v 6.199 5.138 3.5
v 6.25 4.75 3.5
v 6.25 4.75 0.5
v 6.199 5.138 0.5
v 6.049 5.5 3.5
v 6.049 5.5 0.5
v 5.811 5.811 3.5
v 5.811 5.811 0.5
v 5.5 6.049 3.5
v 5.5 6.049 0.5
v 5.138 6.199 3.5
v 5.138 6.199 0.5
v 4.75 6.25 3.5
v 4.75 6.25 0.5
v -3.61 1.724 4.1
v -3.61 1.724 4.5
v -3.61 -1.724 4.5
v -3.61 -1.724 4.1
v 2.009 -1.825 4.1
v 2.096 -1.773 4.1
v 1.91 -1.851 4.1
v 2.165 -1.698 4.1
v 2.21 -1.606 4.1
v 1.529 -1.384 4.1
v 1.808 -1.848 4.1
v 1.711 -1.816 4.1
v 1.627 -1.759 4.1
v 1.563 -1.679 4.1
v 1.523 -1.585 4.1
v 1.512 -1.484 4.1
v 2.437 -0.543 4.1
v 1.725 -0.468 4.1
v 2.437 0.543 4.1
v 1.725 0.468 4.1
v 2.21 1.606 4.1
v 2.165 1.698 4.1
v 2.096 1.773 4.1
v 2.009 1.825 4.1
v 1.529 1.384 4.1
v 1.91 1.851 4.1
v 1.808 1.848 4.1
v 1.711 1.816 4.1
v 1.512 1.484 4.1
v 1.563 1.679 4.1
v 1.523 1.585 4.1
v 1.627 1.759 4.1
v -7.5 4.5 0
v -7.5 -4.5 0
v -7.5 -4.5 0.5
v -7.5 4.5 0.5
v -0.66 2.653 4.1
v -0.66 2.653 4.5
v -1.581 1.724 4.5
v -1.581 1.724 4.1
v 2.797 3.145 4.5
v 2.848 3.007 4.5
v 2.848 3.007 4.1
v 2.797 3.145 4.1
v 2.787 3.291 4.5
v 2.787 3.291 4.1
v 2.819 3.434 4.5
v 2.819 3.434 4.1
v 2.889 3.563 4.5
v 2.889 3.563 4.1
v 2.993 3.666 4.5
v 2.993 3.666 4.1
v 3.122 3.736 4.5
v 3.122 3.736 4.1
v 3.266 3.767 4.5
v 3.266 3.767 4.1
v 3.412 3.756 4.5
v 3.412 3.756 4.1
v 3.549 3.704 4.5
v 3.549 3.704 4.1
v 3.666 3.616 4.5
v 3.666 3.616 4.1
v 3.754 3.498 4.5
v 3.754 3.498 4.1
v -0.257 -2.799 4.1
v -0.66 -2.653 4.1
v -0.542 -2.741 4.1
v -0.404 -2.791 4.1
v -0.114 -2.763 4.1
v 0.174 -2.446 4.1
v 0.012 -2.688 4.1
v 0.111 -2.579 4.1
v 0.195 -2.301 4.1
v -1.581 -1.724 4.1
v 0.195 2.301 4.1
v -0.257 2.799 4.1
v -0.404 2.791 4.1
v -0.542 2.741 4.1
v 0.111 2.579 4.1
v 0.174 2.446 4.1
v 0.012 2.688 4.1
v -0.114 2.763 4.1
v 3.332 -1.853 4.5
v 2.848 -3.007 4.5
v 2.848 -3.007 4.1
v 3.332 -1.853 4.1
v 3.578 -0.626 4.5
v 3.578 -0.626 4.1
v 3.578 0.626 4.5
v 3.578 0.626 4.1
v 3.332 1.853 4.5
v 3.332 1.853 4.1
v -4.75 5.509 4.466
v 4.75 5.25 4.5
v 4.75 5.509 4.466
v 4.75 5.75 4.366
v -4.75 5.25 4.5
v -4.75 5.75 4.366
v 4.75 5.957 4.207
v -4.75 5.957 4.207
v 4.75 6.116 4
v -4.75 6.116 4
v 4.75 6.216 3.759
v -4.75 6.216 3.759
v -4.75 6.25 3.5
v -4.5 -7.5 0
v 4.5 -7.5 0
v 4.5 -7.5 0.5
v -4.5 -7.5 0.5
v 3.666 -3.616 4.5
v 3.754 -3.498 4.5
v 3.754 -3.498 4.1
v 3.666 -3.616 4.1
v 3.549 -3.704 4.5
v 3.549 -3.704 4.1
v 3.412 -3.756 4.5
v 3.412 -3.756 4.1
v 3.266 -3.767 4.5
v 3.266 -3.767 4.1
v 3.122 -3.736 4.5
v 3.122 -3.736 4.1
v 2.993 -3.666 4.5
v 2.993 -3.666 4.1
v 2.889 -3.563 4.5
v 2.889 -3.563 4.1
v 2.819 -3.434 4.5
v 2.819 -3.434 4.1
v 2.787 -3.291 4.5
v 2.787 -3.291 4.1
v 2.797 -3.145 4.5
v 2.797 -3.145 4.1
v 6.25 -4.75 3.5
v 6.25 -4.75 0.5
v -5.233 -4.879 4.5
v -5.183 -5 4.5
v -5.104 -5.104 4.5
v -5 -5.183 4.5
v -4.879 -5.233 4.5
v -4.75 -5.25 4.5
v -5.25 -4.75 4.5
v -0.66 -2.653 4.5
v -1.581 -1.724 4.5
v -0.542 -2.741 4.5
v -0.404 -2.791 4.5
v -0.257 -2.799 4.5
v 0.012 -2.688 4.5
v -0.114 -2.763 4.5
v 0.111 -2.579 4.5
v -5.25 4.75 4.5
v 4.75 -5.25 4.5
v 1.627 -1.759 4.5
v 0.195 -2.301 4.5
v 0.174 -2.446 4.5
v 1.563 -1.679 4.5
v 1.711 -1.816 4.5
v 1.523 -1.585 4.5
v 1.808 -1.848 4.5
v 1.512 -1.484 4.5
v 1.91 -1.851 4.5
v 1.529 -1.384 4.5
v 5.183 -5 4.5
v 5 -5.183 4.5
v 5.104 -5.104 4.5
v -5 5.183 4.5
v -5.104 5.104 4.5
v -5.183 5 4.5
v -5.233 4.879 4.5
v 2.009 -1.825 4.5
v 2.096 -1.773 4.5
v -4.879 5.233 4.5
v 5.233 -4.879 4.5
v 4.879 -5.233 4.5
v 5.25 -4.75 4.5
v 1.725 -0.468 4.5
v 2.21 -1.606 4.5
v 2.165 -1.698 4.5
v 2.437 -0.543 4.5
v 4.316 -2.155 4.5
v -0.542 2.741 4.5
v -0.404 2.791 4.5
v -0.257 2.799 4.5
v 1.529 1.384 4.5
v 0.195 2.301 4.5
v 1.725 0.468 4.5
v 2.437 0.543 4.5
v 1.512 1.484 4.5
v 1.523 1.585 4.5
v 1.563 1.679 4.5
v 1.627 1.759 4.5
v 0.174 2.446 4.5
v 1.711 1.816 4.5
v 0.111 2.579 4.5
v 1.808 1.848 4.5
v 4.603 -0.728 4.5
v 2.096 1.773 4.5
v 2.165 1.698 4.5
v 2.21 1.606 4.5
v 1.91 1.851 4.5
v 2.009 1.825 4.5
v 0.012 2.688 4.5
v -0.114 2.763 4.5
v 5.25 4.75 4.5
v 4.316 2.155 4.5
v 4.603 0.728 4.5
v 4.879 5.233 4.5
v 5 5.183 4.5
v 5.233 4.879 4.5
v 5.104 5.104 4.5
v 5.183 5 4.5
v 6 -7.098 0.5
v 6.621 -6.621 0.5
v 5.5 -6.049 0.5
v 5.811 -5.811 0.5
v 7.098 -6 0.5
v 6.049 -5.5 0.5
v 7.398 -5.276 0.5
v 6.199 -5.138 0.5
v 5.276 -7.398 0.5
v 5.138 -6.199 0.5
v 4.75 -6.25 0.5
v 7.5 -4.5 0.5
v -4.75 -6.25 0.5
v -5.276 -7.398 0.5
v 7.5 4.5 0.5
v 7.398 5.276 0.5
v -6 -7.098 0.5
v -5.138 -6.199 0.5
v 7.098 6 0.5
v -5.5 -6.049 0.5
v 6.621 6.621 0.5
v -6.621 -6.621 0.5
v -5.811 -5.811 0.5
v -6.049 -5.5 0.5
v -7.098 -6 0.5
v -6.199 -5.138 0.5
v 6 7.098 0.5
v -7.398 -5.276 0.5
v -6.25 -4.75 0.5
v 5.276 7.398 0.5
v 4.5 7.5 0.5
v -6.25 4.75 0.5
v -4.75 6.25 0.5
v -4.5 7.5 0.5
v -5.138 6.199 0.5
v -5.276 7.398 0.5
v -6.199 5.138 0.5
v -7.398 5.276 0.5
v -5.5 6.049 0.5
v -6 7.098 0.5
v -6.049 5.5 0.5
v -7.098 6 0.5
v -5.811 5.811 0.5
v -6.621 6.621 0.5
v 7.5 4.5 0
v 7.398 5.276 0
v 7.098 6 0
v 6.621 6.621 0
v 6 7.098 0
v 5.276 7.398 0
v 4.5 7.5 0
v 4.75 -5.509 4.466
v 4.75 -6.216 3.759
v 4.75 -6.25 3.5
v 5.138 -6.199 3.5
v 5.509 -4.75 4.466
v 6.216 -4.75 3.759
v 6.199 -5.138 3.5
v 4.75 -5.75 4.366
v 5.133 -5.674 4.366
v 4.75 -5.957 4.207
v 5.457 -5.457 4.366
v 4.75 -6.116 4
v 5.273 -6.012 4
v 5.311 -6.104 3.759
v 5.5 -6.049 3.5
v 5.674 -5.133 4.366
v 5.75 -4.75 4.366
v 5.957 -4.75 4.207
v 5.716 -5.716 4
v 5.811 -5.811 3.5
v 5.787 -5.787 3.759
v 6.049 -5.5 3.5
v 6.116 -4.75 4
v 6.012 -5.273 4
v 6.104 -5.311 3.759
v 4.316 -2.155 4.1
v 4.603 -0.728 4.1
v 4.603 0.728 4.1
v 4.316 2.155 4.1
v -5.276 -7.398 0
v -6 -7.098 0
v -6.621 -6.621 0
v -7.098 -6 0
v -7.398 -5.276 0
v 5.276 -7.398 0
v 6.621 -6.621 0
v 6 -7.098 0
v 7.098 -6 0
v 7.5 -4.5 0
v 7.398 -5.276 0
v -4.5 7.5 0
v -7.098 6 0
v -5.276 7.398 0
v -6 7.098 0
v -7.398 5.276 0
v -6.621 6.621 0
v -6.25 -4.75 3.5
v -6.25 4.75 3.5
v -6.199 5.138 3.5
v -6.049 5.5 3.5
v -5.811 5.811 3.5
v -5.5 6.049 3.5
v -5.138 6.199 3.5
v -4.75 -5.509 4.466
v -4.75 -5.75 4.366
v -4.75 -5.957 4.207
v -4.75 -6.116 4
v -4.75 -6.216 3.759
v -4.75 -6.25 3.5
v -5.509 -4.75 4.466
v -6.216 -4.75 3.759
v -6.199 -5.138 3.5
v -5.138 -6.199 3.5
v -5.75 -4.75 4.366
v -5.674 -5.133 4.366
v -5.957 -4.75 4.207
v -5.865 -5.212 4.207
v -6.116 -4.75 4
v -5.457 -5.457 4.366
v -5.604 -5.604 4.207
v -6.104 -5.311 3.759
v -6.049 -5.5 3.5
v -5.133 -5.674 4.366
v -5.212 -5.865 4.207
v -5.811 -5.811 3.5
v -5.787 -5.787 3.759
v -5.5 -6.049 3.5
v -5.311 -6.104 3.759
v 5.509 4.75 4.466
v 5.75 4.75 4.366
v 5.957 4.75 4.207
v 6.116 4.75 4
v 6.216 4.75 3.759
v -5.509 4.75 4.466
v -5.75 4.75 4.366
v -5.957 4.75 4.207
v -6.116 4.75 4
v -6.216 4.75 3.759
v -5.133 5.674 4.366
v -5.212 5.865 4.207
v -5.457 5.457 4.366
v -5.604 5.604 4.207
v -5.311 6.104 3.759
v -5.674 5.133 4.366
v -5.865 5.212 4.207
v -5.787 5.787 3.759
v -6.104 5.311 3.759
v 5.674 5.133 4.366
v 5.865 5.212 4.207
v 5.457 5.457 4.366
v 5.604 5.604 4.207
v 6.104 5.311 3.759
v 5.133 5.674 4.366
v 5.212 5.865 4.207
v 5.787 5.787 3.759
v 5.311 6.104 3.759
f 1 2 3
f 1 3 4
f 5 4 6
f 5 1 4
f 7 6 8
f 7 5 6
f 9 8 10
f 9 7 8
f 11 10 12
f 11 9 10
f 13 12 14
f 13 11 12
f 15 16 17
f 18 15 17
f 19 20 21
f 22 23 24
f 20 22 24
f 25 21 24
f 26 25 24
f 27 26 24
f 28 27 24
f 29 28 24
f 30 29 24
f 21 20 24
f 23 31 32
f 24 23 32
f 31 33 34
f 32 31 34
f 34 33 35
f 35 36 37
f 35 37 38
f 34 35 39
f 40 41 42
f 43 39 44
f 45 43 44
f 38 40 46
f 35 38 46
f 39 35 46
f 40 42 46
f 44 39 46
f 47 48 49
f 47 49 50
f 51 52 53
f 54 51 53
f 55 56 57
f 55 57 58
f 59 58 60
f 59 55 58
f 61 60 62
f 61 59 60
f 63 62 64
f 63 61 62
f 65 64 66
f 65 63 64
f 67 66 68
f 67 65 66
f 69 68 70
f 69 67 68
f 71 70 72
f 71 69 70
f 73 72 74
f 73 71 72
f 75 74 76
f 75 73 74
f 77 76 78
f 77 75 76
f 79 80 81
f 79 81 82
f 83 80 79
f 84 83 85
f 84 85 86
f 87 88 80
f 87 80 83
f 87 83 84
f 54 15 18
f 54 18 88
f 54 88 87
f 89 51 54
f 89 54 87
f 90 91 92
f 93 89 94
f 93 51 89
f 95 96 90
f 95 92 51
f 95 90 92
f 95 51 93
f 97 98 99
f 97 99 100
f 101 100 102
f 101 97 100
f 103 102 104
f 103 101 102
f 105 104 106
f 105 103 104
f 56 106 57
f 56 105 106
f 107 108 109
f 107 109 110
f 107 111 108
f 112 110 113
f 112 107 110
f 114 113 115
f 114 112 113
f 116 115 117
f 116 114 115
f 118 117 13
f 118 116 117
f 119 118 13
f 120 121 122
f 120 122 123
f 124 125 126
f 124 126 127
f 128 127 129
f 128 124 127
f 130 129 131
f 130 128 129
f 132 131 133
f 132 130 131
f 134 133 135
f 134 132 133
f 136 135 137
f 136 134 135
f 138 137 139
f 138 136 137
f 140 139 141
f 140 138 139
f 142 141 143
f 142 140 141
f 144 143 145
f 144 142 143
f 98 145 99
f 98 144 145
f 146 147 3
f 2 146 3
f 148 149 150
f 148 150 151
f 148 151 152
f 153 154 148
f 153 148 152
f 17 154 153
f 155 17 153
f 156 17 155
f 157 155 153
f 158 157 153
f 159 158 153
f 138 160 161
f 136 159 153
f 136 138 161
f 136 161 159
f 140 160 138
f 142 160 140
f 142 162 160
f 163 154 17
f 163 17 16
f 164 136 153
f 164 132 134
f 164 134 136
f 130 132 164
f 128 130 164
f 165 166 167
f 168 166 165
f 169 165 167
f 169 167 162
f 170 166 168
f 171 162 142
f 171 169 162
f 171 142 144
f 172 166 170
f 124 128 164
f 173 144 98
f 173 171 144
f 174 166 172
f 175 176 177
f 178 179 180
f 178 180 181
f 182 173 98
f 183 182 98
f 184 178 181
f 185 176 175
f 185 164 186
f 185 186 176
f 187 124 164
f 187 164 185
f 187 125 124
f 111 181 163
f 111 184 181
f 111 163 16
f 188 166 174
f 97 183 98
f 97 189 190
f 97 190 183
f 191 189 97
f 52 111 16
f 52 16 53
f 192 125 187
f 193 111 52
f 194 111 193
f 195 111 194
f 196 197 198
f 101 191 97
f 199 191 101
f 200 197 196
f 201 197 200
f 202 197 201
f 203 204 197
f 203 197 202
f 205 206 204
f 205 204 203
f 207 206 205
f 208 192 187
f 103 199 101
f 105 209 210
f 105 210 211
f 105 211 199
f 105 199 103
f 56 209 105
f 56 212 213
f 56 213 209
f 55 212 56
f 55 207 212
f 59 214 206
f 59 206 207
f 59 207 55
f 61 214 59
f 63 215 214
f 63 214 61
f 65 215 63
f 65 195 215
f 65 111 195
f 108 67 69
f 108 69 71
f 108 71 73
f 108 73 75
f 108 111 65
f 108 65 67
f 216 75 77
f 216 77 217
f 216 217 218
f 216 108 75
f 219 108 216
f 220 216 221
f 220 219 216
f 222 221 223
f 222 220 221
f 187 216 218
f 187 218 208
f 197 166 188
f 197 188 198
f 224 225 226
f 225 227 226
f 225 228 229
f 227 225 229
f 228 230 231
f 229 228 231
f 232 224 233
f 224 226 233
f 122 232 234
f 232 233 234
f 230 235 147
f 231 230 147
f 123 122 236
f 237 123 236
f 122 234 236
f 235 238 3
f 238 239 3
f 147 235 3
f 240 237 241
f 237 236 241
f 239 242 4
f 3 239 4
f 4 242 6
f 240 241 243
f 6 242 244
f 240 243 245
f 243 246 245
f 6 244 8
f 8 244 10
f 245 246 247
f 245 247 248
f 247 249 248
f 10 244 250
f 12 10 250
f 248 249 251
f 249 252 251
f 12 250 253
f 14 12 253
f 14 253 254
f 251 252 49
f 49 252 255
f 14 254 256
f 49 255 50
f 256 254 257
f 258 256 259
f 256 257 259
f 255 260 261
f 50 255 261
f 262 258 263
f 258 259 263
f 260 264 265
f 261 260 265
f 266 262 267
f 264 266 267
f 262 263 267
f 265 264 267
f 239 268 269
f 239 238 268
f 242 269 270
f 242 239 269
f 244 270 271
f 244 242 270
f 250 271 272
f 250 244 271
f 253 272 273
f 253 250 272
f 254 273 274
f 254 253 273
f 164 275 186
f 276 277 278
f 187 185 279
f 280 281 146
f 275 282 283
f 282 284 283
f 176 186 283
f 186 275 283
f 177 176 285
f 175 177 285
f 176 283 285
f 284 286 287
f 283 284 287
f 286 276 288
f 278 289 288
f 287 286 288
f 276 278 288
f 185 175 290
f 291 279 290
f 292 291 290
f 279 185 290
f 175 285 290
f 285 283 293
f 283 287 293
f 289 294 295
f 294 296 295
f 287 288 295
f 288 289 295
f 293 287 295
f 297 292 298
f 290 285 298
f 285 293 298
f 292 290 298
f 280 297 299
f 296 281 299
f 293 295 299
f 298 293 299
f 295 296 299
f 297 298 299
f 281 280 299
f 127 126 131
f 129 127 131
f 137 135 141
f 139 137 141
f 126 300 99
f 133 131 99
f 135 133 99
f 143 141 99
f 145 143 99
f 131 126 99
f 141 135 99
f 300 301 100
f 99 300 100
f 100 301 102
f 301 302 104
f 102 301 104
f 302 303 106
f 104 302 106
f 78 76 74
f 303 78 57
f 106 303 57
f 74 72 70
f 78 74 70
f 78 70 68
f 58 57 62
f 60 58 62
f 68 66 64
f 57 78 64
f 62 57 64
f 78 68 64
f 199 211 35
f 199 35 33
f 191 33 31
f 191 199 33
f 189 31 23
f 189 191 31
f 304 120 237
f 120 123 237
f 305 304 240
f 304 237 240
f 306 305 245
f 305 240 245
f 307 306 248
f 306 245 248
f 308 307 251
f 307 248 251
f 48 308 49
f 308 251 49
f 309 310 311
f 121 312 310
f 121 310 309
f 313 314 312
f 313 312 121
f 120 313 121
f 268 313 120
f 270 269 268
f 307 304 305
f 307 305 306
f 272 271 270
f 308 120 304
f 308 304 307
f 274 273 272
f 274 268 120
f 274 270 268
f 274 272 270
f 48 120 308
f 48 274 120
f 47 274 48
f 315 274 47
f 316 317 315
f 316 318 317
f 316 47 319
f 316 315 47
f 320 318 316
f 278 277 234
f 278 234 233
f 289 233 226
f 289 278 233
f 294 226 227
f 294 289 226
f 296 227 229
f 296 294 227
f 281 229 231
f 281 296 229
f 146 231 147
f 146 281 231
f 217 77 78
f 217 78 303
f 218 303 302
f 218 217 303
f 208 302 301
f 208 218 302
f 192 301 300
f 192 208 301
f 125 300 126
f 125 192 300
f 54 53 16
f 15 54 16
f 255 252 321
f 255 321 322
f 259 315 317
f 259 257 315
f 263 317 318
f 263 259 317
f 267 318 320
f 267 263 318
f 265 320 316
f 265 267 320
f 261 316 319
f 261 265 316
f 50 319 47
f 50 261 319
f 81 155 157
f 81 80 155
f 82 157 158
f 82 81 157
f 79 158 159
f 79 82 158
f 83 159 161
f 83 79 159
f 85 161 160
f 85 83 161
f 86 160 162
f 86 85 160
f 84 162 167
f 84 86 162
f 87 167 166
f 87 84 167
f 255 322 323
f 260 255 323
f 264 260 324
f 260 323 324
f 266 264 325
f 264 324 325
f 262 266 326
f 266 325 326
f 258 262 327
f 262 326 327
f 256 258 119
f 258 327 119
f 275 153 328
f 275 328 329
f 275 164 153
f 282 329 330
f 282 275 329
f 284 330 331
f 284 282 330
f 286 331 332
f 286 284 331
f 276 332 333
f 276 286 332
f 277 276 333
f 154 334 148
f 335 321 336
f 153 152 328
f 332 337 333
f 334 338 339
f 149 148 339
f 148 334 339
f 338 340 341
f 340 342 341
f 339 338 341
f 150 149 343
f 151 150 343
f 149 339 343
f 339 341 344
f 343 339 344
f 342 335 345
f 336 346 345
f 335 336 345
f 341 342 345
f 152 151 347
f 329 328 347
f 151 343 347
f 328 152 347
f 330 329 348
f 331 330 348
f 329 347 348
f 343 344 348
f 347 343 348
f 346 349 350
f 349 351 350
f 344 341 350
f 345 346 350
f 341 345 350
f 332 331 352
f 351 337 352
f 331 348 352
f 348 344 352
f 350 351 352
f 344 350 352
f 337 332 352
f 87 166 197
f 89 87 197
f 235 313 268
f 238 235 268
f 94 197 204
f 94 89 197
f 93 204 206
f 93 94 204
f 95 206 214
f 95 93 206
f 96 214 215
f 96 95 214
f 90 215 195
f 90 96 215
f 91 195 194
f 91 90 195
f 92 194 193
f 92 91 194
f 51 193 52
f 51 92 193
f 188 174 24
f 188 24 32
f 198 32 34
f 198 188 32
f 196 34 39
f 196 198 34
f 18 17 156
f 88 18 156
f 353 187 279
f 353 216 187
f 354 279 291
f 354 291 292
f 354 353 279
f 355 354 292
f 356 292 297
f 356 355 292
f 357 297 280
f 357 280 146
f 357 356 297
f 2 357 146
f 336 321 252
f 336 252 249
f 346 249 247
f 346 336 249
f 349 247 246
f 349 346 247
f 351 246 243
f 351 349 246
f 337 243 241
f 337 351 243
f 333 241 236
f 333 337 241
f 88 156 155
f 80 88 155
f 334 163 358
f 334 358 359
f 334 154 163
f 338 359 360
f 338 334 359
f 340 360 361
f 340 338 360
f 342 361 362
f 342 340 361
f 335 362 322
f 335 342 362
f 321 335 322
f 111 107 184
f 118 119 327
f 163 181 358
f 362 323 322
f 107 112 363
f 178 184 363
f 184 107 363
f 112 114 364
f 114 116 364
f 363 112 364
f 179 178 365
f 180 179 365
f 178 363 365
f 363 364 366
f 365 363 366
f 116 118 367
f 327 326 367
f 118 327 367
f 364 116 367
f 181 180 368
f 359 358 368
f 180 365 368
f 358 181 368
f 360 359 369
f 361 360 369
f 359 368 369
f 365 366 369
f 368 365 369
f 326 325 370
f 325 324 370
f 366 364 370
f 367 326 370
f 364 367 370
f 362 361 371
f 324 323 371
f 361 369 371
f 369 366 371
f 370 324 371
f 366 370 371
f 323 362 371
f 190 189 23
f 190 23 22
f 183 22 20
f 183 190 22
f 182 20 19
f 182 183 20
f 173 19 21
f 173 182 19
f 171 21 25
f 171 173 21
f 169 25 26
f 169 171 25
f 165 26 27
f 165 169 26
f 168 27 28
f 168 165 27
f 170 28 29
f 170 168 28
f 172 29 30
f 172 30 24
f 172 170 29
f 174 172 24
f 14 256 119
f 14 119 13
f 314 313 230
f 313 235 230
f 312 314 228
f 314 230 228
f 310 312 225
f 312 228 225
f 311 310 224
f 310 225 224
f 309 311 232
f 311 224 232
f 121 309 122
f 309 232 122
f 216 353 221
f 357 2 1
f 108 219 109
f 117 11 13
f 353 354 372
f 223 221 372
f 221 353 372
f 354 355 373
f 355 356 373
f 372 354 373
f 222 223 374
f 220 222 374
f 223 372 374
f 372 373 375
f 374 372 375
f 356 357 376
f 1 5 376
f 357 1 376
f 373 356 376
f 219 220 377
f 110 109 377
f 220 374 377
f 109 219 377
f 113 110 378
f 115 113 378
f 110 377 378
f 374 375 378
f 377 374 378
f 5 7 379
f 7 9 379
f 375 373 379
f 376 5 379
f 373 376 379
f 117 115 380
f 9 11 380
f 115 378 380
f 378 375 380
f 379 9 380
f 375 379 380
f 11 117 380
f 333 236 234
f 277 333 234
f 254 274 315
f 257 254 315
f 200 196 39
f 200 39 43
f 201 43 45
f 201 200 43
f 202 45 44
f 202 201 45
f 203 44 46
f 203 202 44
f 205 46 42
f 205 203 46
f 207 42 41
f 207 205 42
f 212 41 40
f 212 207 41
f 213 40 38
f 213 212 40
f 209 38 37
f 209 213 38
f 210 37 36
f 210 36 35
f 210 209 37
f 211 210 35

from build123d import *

# Parameters (mm, degrees)
SKETCH_1_W          = 12.5
SKETCH_1_H          = 12.5
EXTRUDE_412_DEPTH   = 4.5
FILLET_1_R          = 1.5
FILLET_2_R          = 1
SKETCH_2_W          = 15
SKETCH_2_H          = 15
EXTRUDE_1329_DEPTH  = 0.5
FILLET_3_R          = 3
CUT_EXTRUDE_1_DEPTH = 0.4
FILLET_4_R          = 0.5


with BuildPart() as part:
    # Эскиз1 → Extrude 412 (new body)
    with BuildSketch(Plane.XY):
        Rectangle(SKETCH_1_W, SKETCH_1_H)
    extrude(amount=EXTRUDE_412_DEPTH)

    # Скругление1
    fillet_1_edges = [part.edges().sort_by_distance(p)[0] for p in [
        (-6.25, 6.25, 2.25),
        (6.25, 6.25, 2.25),
        (6.25, -6.25, 2.25),
        (-6.25, -6.25, 2.25),
    ]]
    fillet(fillet_1_edges, radius=FILLET_1_R)

    # Скругление2
    fillet_2_edges = [part.edges().sort_by_distance(p)[0] for p in [
        (6.25, 0, 4.5),
        (0, -6.25, 4.5),
        (-6.25, 0, 4.5),
        (0, 6.25, 4.5),
        (-5.810660172, -5.810660172, 4.5),
        (-5.810660172, 5.810660172, 4.5),
        (5.810660172, 5.810660172, 4.5),
        (5.810660172, -5.810660172, 4.5),
    ]]
    fillet(fillet_2_edges, radius=FILLET_2_R)

    # Эскиз2 → Extrude 1329 (add)
    with BuildSketch(Plane(origin=(0, 0, 0), x_dir=(-1, 0, 0), z_dir=(0, 0, -1))):
        Rectangle(SKETCH_2_W, SKETCH_2_H)
    extrude(amount=-EXTRUDE_1329_DEPTH)

    # Скругление3
    fillet_3_edges = [part.edges().sort_by_distance(p)[0] for p in [
        (7.5, -7.5, 0.25),
        (7.5, 7.5, 0.25),
        (-7.5, 7.5, 0.25),
        (-7.5, -7.5, 0.25),
    ]]
    fillet(fillet_3_edges, radius=FILLET_3_R)

    # Эскиз4 → Вырез-Вытянуть1 (cut)
    with BuildSketch(Plane.XY.offset(4.5)):
        Polygon((-3.61015121, 1.724032908), (-3.61015121, -1.724032908), (-1.580654119, -1.724032908), (0.195408328, -3.515449311), (0.195408328, 3.515449311), (-1.580654119, 1.724032908), align=None)
        with BuildLine():
            ThreePointArc((1.529185986, -1.383686517), (1.749358373, 0), (1.529185986, 1.383686517))
            ThreePointArc((1.529185986, 1.383686517), (1.758587632, 1.835514539), (2.210415654, 1.606112893))
            ThreePointArc((2.210415654, 1.606112893), (2.465980556, 0), (2.210415654, -1.606112893))
            ThreePointArc((2.210415654, -1.606112893), (1.758587632, -1.835514539), (1.529185986, -1.383686517))
        make_face()
        with BuildLine():
            ThreePointArc((2.847646844, -3.007485014), (3.609370922, 0), (2.847646844, 3.007485014))
            ThreePointArc((2.847646844, 3.007485014), (3.055453428, 3.70569516), (3.753663574, 3.497888576))
            ThreePointArc((3.753663574, 3.497888576), (4.639595154, 0), (3.753663574, -3.497888576))
            ThreePointArc((3.753663574, -3.497888576), (3.055453428, -3.70569516), (2.847646844, -3.007485014))
        make_face()
    extrude(amount=-CUT_EXTRUDE_1_DEPTH, mode=Mode.SUBTRACT)

    # Скругление4
    fillet_4_edges = [part.edges().sort_by_distance(p)[0] for p in [
        (0.195408328, 3.515449311, 4.3),
        (0.195408328, -3.515449311, 4.3),
    ]]
    fillet(fillet_4_edges, radius=FILLET_4_R)


solid = part.part
